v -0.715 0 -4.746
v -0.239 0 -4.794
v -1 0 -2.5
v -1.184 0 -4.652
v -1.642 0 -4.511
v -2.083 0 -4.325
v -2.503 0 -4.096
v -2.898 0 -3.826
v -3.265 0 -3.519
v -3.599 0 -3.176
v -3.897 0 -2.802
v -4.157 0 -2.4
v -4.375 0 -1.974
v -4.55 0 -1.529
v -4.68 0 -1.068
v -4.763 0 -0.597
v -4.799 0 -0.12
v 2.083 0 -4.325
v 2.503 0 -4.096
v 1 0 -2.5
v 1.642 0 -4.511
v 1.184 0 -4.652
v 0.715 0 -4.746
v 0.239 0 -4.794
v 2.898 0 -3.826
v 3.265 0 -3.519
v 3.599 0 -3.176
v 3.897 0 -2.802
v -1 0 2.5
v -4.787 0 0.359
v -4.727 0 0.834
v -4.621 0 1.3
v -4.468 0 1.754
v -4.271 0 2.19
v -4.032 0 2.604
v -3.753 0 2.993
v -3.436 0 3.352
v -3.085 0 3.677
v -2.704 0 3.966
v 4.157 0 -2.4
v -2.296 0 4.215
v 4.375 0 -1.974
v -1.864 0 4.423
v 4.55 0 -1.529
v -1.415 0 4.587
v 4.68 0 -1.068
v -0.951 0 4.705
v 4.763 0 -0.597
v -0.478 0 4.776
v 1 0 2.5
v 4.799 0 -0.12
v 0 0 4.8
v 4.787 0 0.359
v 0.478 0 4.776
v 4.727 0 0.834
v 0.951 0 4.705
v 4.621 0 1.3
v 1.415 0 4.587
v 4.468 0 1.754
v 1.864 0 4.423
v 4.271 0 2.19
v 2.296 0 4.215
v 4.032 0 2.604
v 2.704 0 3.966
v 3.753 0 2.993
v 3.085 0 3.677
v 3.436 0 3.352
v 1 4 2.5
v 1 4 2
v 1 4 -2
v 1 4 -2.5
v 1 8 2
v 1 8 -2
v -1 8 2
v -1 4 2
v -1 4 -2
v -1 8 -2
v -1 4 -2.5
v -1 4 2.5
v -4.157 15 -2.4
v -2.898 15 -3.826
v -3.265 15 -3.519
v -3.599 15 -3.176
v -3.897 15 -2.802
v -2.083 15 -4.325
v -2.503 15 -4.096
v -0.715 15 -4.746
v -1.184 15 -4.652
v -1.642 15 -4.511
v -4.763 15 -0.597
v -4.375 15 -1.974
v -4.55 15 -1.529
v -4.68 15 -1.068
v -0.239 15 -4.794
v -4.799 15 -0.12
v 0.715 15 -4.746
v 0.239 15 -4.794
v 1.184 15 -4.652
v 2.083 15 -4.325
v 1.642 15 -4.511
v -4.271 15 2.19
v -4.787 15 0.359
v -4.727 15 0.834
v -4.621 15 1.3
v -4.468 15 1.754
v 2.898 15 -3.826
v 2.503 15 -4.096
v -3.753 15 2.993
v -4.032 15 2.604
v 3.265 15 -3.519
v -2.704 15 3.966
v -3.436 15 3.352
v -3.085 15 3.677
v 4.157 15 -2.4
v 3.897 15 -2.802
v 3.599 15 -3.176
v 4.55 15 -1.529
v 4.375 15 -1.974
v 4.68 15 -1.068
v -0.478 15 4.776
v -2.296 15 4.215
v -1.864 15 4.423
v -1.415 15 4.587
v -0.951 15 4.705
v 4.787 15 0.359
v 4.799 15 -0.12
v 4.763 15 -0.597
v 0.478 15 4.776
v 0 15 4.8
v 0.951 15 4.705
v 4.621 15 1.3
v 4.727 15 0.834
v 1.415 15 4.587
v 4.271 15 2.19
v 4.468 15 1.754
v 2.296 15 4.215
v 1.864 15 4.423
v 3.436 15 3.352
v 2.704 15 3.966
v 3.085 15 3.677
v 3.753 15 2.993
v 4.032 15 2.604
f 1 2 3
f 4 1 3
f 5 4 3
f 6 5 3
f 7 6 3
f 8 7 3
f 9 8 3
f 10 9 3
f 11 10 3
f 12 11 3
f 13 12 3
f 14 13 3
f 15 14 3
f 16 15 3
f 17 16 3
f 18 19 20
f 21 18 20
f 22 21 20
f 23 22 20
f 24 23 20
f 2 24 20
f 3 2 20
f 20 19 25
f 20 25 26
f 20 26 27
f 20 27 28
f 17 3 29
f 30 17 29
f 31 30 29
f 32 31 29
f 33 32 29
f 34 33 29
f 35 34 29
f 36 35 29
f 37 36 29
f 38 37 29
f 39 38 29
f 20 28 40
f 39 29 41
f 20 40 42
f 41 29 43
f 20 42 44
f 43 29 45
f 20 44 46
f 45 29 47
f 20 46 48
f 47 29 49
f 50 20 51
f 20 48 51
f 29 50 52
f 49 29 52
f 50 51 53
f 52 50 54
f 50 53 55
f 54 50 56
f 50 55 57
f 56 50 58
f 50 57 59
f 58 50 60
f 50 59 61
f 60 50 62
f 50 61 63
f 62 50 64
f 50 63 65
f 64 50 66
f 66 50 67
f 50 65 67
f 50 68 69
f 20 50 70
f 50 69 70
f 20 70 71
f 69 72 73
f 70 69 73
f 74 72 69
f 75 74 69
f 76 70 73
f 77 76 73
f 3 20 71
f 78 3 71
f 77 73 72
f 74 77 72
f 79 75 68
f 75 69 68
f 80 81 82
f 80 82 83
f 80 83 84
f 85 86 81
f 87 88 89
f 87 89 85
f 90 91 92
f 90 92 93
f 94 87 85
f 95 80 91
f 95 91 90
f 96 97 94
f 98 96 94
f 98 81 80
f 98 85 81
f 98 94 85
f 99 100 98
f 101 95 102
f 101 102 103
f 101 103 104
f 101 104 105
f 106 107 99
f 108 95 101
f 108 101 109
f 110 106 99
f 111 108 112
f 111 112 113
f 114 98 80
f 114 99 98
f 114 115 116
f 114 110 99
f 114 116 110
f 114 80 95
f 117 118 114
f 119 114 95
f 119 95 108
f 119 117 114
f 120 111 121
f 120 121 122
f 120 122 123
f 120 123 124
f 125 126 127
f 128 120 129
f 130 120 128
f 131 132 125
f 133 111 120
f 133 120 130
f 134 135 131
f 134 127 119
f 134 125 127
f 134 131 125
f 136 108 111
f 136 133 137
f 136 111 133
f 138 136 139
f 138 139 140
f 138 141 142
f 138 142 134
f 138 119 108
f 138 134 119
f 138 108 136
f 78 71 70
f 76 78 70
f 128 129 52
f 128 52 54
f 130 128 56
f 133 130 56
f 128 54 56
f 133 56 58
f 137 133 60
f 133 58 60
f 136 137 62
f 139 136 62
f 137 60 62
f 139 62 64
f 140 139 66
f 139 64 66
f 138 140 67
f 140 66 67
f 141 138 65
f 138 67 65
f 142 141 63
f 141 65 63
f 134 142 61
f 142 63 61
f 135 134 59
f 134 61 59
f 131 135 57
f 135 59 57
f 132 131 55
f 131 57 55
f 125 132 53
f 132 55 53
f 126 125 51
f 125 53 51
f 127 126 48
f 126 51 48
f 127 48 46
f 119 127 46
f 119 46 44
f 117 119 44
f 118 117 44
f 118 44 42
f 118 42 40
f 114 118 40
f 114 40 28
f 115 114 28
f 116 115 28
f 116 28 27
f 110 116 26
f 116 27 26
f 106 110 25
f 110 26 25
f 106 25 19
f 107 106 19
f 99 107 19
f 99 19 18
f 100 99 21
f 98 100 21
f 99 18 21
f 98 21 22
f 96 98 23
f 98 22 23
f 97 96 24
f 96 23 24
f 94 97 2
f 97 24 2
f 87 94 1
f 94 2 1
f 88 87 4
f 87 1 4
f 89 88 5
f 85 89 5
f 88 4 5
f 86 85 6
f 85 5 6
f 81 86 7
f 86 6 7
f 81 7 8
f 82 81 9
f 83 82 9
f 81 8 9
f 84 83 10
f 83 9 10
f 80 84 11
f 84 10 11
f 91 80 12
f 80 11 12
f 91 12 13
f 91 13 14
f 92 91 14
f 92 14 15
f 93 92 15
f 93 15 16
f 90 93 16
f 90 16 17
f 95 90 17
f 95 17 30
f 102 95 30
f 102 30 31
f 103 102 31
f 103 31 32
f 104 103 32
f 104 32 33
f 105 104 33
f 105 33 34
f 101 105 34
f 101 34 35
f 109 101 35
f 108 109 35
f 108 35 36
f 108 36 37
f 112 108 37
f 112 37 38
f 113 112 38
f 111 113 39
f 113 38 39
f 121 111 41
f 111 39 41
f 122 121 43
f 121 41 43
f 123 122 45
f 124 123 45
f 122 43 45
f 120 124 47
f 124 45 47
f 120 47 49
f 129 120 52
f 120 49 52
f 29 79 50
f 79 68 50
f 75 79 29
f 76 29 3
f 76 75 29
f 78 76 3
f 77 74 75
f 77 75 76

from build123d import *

# Parameters (mm, degrees)
SKETCH1_R           = 4.8
BOSS_EXTRUDE1_DEPTH = 15
CUT_EXTRUDE1_DEPTH  = 1


with BuildPart() as part:
    # Sketch1 → Boss-Extrude1 (new body)
    with BuildSketch(Plane(origin=(0, 0, 0), x_dir=(1, 0, 0), z_dir=(0, 1, 0))):
        with Locations(Location((0, 0, 0), (0, 0, 270))):  # turned: the seam where the file's is
            Circle(SKETCH1_R)
    extrude(amount=BOSS_EXTRUDE1_DEPTH)

    # Sketch2 → Cut-Extrude1 (cut, symmetric)
    with BuildSketch(Plane(origin=(0, 0, 0), x_dir=(0, 0, -1), z_dir=(1, 0, 0))):
        Polygon((-2.5, 0), (2.5, 0), (2.5, 4), (2, 4), (2, 8), (-2, 8), (-2, 4), (-2.5, 4), align=None)
    extrude(amount=CUT_EXTRUDE1_DEPTH, both=True, mode=Mode.SUBTRACT)


solid = part.part
